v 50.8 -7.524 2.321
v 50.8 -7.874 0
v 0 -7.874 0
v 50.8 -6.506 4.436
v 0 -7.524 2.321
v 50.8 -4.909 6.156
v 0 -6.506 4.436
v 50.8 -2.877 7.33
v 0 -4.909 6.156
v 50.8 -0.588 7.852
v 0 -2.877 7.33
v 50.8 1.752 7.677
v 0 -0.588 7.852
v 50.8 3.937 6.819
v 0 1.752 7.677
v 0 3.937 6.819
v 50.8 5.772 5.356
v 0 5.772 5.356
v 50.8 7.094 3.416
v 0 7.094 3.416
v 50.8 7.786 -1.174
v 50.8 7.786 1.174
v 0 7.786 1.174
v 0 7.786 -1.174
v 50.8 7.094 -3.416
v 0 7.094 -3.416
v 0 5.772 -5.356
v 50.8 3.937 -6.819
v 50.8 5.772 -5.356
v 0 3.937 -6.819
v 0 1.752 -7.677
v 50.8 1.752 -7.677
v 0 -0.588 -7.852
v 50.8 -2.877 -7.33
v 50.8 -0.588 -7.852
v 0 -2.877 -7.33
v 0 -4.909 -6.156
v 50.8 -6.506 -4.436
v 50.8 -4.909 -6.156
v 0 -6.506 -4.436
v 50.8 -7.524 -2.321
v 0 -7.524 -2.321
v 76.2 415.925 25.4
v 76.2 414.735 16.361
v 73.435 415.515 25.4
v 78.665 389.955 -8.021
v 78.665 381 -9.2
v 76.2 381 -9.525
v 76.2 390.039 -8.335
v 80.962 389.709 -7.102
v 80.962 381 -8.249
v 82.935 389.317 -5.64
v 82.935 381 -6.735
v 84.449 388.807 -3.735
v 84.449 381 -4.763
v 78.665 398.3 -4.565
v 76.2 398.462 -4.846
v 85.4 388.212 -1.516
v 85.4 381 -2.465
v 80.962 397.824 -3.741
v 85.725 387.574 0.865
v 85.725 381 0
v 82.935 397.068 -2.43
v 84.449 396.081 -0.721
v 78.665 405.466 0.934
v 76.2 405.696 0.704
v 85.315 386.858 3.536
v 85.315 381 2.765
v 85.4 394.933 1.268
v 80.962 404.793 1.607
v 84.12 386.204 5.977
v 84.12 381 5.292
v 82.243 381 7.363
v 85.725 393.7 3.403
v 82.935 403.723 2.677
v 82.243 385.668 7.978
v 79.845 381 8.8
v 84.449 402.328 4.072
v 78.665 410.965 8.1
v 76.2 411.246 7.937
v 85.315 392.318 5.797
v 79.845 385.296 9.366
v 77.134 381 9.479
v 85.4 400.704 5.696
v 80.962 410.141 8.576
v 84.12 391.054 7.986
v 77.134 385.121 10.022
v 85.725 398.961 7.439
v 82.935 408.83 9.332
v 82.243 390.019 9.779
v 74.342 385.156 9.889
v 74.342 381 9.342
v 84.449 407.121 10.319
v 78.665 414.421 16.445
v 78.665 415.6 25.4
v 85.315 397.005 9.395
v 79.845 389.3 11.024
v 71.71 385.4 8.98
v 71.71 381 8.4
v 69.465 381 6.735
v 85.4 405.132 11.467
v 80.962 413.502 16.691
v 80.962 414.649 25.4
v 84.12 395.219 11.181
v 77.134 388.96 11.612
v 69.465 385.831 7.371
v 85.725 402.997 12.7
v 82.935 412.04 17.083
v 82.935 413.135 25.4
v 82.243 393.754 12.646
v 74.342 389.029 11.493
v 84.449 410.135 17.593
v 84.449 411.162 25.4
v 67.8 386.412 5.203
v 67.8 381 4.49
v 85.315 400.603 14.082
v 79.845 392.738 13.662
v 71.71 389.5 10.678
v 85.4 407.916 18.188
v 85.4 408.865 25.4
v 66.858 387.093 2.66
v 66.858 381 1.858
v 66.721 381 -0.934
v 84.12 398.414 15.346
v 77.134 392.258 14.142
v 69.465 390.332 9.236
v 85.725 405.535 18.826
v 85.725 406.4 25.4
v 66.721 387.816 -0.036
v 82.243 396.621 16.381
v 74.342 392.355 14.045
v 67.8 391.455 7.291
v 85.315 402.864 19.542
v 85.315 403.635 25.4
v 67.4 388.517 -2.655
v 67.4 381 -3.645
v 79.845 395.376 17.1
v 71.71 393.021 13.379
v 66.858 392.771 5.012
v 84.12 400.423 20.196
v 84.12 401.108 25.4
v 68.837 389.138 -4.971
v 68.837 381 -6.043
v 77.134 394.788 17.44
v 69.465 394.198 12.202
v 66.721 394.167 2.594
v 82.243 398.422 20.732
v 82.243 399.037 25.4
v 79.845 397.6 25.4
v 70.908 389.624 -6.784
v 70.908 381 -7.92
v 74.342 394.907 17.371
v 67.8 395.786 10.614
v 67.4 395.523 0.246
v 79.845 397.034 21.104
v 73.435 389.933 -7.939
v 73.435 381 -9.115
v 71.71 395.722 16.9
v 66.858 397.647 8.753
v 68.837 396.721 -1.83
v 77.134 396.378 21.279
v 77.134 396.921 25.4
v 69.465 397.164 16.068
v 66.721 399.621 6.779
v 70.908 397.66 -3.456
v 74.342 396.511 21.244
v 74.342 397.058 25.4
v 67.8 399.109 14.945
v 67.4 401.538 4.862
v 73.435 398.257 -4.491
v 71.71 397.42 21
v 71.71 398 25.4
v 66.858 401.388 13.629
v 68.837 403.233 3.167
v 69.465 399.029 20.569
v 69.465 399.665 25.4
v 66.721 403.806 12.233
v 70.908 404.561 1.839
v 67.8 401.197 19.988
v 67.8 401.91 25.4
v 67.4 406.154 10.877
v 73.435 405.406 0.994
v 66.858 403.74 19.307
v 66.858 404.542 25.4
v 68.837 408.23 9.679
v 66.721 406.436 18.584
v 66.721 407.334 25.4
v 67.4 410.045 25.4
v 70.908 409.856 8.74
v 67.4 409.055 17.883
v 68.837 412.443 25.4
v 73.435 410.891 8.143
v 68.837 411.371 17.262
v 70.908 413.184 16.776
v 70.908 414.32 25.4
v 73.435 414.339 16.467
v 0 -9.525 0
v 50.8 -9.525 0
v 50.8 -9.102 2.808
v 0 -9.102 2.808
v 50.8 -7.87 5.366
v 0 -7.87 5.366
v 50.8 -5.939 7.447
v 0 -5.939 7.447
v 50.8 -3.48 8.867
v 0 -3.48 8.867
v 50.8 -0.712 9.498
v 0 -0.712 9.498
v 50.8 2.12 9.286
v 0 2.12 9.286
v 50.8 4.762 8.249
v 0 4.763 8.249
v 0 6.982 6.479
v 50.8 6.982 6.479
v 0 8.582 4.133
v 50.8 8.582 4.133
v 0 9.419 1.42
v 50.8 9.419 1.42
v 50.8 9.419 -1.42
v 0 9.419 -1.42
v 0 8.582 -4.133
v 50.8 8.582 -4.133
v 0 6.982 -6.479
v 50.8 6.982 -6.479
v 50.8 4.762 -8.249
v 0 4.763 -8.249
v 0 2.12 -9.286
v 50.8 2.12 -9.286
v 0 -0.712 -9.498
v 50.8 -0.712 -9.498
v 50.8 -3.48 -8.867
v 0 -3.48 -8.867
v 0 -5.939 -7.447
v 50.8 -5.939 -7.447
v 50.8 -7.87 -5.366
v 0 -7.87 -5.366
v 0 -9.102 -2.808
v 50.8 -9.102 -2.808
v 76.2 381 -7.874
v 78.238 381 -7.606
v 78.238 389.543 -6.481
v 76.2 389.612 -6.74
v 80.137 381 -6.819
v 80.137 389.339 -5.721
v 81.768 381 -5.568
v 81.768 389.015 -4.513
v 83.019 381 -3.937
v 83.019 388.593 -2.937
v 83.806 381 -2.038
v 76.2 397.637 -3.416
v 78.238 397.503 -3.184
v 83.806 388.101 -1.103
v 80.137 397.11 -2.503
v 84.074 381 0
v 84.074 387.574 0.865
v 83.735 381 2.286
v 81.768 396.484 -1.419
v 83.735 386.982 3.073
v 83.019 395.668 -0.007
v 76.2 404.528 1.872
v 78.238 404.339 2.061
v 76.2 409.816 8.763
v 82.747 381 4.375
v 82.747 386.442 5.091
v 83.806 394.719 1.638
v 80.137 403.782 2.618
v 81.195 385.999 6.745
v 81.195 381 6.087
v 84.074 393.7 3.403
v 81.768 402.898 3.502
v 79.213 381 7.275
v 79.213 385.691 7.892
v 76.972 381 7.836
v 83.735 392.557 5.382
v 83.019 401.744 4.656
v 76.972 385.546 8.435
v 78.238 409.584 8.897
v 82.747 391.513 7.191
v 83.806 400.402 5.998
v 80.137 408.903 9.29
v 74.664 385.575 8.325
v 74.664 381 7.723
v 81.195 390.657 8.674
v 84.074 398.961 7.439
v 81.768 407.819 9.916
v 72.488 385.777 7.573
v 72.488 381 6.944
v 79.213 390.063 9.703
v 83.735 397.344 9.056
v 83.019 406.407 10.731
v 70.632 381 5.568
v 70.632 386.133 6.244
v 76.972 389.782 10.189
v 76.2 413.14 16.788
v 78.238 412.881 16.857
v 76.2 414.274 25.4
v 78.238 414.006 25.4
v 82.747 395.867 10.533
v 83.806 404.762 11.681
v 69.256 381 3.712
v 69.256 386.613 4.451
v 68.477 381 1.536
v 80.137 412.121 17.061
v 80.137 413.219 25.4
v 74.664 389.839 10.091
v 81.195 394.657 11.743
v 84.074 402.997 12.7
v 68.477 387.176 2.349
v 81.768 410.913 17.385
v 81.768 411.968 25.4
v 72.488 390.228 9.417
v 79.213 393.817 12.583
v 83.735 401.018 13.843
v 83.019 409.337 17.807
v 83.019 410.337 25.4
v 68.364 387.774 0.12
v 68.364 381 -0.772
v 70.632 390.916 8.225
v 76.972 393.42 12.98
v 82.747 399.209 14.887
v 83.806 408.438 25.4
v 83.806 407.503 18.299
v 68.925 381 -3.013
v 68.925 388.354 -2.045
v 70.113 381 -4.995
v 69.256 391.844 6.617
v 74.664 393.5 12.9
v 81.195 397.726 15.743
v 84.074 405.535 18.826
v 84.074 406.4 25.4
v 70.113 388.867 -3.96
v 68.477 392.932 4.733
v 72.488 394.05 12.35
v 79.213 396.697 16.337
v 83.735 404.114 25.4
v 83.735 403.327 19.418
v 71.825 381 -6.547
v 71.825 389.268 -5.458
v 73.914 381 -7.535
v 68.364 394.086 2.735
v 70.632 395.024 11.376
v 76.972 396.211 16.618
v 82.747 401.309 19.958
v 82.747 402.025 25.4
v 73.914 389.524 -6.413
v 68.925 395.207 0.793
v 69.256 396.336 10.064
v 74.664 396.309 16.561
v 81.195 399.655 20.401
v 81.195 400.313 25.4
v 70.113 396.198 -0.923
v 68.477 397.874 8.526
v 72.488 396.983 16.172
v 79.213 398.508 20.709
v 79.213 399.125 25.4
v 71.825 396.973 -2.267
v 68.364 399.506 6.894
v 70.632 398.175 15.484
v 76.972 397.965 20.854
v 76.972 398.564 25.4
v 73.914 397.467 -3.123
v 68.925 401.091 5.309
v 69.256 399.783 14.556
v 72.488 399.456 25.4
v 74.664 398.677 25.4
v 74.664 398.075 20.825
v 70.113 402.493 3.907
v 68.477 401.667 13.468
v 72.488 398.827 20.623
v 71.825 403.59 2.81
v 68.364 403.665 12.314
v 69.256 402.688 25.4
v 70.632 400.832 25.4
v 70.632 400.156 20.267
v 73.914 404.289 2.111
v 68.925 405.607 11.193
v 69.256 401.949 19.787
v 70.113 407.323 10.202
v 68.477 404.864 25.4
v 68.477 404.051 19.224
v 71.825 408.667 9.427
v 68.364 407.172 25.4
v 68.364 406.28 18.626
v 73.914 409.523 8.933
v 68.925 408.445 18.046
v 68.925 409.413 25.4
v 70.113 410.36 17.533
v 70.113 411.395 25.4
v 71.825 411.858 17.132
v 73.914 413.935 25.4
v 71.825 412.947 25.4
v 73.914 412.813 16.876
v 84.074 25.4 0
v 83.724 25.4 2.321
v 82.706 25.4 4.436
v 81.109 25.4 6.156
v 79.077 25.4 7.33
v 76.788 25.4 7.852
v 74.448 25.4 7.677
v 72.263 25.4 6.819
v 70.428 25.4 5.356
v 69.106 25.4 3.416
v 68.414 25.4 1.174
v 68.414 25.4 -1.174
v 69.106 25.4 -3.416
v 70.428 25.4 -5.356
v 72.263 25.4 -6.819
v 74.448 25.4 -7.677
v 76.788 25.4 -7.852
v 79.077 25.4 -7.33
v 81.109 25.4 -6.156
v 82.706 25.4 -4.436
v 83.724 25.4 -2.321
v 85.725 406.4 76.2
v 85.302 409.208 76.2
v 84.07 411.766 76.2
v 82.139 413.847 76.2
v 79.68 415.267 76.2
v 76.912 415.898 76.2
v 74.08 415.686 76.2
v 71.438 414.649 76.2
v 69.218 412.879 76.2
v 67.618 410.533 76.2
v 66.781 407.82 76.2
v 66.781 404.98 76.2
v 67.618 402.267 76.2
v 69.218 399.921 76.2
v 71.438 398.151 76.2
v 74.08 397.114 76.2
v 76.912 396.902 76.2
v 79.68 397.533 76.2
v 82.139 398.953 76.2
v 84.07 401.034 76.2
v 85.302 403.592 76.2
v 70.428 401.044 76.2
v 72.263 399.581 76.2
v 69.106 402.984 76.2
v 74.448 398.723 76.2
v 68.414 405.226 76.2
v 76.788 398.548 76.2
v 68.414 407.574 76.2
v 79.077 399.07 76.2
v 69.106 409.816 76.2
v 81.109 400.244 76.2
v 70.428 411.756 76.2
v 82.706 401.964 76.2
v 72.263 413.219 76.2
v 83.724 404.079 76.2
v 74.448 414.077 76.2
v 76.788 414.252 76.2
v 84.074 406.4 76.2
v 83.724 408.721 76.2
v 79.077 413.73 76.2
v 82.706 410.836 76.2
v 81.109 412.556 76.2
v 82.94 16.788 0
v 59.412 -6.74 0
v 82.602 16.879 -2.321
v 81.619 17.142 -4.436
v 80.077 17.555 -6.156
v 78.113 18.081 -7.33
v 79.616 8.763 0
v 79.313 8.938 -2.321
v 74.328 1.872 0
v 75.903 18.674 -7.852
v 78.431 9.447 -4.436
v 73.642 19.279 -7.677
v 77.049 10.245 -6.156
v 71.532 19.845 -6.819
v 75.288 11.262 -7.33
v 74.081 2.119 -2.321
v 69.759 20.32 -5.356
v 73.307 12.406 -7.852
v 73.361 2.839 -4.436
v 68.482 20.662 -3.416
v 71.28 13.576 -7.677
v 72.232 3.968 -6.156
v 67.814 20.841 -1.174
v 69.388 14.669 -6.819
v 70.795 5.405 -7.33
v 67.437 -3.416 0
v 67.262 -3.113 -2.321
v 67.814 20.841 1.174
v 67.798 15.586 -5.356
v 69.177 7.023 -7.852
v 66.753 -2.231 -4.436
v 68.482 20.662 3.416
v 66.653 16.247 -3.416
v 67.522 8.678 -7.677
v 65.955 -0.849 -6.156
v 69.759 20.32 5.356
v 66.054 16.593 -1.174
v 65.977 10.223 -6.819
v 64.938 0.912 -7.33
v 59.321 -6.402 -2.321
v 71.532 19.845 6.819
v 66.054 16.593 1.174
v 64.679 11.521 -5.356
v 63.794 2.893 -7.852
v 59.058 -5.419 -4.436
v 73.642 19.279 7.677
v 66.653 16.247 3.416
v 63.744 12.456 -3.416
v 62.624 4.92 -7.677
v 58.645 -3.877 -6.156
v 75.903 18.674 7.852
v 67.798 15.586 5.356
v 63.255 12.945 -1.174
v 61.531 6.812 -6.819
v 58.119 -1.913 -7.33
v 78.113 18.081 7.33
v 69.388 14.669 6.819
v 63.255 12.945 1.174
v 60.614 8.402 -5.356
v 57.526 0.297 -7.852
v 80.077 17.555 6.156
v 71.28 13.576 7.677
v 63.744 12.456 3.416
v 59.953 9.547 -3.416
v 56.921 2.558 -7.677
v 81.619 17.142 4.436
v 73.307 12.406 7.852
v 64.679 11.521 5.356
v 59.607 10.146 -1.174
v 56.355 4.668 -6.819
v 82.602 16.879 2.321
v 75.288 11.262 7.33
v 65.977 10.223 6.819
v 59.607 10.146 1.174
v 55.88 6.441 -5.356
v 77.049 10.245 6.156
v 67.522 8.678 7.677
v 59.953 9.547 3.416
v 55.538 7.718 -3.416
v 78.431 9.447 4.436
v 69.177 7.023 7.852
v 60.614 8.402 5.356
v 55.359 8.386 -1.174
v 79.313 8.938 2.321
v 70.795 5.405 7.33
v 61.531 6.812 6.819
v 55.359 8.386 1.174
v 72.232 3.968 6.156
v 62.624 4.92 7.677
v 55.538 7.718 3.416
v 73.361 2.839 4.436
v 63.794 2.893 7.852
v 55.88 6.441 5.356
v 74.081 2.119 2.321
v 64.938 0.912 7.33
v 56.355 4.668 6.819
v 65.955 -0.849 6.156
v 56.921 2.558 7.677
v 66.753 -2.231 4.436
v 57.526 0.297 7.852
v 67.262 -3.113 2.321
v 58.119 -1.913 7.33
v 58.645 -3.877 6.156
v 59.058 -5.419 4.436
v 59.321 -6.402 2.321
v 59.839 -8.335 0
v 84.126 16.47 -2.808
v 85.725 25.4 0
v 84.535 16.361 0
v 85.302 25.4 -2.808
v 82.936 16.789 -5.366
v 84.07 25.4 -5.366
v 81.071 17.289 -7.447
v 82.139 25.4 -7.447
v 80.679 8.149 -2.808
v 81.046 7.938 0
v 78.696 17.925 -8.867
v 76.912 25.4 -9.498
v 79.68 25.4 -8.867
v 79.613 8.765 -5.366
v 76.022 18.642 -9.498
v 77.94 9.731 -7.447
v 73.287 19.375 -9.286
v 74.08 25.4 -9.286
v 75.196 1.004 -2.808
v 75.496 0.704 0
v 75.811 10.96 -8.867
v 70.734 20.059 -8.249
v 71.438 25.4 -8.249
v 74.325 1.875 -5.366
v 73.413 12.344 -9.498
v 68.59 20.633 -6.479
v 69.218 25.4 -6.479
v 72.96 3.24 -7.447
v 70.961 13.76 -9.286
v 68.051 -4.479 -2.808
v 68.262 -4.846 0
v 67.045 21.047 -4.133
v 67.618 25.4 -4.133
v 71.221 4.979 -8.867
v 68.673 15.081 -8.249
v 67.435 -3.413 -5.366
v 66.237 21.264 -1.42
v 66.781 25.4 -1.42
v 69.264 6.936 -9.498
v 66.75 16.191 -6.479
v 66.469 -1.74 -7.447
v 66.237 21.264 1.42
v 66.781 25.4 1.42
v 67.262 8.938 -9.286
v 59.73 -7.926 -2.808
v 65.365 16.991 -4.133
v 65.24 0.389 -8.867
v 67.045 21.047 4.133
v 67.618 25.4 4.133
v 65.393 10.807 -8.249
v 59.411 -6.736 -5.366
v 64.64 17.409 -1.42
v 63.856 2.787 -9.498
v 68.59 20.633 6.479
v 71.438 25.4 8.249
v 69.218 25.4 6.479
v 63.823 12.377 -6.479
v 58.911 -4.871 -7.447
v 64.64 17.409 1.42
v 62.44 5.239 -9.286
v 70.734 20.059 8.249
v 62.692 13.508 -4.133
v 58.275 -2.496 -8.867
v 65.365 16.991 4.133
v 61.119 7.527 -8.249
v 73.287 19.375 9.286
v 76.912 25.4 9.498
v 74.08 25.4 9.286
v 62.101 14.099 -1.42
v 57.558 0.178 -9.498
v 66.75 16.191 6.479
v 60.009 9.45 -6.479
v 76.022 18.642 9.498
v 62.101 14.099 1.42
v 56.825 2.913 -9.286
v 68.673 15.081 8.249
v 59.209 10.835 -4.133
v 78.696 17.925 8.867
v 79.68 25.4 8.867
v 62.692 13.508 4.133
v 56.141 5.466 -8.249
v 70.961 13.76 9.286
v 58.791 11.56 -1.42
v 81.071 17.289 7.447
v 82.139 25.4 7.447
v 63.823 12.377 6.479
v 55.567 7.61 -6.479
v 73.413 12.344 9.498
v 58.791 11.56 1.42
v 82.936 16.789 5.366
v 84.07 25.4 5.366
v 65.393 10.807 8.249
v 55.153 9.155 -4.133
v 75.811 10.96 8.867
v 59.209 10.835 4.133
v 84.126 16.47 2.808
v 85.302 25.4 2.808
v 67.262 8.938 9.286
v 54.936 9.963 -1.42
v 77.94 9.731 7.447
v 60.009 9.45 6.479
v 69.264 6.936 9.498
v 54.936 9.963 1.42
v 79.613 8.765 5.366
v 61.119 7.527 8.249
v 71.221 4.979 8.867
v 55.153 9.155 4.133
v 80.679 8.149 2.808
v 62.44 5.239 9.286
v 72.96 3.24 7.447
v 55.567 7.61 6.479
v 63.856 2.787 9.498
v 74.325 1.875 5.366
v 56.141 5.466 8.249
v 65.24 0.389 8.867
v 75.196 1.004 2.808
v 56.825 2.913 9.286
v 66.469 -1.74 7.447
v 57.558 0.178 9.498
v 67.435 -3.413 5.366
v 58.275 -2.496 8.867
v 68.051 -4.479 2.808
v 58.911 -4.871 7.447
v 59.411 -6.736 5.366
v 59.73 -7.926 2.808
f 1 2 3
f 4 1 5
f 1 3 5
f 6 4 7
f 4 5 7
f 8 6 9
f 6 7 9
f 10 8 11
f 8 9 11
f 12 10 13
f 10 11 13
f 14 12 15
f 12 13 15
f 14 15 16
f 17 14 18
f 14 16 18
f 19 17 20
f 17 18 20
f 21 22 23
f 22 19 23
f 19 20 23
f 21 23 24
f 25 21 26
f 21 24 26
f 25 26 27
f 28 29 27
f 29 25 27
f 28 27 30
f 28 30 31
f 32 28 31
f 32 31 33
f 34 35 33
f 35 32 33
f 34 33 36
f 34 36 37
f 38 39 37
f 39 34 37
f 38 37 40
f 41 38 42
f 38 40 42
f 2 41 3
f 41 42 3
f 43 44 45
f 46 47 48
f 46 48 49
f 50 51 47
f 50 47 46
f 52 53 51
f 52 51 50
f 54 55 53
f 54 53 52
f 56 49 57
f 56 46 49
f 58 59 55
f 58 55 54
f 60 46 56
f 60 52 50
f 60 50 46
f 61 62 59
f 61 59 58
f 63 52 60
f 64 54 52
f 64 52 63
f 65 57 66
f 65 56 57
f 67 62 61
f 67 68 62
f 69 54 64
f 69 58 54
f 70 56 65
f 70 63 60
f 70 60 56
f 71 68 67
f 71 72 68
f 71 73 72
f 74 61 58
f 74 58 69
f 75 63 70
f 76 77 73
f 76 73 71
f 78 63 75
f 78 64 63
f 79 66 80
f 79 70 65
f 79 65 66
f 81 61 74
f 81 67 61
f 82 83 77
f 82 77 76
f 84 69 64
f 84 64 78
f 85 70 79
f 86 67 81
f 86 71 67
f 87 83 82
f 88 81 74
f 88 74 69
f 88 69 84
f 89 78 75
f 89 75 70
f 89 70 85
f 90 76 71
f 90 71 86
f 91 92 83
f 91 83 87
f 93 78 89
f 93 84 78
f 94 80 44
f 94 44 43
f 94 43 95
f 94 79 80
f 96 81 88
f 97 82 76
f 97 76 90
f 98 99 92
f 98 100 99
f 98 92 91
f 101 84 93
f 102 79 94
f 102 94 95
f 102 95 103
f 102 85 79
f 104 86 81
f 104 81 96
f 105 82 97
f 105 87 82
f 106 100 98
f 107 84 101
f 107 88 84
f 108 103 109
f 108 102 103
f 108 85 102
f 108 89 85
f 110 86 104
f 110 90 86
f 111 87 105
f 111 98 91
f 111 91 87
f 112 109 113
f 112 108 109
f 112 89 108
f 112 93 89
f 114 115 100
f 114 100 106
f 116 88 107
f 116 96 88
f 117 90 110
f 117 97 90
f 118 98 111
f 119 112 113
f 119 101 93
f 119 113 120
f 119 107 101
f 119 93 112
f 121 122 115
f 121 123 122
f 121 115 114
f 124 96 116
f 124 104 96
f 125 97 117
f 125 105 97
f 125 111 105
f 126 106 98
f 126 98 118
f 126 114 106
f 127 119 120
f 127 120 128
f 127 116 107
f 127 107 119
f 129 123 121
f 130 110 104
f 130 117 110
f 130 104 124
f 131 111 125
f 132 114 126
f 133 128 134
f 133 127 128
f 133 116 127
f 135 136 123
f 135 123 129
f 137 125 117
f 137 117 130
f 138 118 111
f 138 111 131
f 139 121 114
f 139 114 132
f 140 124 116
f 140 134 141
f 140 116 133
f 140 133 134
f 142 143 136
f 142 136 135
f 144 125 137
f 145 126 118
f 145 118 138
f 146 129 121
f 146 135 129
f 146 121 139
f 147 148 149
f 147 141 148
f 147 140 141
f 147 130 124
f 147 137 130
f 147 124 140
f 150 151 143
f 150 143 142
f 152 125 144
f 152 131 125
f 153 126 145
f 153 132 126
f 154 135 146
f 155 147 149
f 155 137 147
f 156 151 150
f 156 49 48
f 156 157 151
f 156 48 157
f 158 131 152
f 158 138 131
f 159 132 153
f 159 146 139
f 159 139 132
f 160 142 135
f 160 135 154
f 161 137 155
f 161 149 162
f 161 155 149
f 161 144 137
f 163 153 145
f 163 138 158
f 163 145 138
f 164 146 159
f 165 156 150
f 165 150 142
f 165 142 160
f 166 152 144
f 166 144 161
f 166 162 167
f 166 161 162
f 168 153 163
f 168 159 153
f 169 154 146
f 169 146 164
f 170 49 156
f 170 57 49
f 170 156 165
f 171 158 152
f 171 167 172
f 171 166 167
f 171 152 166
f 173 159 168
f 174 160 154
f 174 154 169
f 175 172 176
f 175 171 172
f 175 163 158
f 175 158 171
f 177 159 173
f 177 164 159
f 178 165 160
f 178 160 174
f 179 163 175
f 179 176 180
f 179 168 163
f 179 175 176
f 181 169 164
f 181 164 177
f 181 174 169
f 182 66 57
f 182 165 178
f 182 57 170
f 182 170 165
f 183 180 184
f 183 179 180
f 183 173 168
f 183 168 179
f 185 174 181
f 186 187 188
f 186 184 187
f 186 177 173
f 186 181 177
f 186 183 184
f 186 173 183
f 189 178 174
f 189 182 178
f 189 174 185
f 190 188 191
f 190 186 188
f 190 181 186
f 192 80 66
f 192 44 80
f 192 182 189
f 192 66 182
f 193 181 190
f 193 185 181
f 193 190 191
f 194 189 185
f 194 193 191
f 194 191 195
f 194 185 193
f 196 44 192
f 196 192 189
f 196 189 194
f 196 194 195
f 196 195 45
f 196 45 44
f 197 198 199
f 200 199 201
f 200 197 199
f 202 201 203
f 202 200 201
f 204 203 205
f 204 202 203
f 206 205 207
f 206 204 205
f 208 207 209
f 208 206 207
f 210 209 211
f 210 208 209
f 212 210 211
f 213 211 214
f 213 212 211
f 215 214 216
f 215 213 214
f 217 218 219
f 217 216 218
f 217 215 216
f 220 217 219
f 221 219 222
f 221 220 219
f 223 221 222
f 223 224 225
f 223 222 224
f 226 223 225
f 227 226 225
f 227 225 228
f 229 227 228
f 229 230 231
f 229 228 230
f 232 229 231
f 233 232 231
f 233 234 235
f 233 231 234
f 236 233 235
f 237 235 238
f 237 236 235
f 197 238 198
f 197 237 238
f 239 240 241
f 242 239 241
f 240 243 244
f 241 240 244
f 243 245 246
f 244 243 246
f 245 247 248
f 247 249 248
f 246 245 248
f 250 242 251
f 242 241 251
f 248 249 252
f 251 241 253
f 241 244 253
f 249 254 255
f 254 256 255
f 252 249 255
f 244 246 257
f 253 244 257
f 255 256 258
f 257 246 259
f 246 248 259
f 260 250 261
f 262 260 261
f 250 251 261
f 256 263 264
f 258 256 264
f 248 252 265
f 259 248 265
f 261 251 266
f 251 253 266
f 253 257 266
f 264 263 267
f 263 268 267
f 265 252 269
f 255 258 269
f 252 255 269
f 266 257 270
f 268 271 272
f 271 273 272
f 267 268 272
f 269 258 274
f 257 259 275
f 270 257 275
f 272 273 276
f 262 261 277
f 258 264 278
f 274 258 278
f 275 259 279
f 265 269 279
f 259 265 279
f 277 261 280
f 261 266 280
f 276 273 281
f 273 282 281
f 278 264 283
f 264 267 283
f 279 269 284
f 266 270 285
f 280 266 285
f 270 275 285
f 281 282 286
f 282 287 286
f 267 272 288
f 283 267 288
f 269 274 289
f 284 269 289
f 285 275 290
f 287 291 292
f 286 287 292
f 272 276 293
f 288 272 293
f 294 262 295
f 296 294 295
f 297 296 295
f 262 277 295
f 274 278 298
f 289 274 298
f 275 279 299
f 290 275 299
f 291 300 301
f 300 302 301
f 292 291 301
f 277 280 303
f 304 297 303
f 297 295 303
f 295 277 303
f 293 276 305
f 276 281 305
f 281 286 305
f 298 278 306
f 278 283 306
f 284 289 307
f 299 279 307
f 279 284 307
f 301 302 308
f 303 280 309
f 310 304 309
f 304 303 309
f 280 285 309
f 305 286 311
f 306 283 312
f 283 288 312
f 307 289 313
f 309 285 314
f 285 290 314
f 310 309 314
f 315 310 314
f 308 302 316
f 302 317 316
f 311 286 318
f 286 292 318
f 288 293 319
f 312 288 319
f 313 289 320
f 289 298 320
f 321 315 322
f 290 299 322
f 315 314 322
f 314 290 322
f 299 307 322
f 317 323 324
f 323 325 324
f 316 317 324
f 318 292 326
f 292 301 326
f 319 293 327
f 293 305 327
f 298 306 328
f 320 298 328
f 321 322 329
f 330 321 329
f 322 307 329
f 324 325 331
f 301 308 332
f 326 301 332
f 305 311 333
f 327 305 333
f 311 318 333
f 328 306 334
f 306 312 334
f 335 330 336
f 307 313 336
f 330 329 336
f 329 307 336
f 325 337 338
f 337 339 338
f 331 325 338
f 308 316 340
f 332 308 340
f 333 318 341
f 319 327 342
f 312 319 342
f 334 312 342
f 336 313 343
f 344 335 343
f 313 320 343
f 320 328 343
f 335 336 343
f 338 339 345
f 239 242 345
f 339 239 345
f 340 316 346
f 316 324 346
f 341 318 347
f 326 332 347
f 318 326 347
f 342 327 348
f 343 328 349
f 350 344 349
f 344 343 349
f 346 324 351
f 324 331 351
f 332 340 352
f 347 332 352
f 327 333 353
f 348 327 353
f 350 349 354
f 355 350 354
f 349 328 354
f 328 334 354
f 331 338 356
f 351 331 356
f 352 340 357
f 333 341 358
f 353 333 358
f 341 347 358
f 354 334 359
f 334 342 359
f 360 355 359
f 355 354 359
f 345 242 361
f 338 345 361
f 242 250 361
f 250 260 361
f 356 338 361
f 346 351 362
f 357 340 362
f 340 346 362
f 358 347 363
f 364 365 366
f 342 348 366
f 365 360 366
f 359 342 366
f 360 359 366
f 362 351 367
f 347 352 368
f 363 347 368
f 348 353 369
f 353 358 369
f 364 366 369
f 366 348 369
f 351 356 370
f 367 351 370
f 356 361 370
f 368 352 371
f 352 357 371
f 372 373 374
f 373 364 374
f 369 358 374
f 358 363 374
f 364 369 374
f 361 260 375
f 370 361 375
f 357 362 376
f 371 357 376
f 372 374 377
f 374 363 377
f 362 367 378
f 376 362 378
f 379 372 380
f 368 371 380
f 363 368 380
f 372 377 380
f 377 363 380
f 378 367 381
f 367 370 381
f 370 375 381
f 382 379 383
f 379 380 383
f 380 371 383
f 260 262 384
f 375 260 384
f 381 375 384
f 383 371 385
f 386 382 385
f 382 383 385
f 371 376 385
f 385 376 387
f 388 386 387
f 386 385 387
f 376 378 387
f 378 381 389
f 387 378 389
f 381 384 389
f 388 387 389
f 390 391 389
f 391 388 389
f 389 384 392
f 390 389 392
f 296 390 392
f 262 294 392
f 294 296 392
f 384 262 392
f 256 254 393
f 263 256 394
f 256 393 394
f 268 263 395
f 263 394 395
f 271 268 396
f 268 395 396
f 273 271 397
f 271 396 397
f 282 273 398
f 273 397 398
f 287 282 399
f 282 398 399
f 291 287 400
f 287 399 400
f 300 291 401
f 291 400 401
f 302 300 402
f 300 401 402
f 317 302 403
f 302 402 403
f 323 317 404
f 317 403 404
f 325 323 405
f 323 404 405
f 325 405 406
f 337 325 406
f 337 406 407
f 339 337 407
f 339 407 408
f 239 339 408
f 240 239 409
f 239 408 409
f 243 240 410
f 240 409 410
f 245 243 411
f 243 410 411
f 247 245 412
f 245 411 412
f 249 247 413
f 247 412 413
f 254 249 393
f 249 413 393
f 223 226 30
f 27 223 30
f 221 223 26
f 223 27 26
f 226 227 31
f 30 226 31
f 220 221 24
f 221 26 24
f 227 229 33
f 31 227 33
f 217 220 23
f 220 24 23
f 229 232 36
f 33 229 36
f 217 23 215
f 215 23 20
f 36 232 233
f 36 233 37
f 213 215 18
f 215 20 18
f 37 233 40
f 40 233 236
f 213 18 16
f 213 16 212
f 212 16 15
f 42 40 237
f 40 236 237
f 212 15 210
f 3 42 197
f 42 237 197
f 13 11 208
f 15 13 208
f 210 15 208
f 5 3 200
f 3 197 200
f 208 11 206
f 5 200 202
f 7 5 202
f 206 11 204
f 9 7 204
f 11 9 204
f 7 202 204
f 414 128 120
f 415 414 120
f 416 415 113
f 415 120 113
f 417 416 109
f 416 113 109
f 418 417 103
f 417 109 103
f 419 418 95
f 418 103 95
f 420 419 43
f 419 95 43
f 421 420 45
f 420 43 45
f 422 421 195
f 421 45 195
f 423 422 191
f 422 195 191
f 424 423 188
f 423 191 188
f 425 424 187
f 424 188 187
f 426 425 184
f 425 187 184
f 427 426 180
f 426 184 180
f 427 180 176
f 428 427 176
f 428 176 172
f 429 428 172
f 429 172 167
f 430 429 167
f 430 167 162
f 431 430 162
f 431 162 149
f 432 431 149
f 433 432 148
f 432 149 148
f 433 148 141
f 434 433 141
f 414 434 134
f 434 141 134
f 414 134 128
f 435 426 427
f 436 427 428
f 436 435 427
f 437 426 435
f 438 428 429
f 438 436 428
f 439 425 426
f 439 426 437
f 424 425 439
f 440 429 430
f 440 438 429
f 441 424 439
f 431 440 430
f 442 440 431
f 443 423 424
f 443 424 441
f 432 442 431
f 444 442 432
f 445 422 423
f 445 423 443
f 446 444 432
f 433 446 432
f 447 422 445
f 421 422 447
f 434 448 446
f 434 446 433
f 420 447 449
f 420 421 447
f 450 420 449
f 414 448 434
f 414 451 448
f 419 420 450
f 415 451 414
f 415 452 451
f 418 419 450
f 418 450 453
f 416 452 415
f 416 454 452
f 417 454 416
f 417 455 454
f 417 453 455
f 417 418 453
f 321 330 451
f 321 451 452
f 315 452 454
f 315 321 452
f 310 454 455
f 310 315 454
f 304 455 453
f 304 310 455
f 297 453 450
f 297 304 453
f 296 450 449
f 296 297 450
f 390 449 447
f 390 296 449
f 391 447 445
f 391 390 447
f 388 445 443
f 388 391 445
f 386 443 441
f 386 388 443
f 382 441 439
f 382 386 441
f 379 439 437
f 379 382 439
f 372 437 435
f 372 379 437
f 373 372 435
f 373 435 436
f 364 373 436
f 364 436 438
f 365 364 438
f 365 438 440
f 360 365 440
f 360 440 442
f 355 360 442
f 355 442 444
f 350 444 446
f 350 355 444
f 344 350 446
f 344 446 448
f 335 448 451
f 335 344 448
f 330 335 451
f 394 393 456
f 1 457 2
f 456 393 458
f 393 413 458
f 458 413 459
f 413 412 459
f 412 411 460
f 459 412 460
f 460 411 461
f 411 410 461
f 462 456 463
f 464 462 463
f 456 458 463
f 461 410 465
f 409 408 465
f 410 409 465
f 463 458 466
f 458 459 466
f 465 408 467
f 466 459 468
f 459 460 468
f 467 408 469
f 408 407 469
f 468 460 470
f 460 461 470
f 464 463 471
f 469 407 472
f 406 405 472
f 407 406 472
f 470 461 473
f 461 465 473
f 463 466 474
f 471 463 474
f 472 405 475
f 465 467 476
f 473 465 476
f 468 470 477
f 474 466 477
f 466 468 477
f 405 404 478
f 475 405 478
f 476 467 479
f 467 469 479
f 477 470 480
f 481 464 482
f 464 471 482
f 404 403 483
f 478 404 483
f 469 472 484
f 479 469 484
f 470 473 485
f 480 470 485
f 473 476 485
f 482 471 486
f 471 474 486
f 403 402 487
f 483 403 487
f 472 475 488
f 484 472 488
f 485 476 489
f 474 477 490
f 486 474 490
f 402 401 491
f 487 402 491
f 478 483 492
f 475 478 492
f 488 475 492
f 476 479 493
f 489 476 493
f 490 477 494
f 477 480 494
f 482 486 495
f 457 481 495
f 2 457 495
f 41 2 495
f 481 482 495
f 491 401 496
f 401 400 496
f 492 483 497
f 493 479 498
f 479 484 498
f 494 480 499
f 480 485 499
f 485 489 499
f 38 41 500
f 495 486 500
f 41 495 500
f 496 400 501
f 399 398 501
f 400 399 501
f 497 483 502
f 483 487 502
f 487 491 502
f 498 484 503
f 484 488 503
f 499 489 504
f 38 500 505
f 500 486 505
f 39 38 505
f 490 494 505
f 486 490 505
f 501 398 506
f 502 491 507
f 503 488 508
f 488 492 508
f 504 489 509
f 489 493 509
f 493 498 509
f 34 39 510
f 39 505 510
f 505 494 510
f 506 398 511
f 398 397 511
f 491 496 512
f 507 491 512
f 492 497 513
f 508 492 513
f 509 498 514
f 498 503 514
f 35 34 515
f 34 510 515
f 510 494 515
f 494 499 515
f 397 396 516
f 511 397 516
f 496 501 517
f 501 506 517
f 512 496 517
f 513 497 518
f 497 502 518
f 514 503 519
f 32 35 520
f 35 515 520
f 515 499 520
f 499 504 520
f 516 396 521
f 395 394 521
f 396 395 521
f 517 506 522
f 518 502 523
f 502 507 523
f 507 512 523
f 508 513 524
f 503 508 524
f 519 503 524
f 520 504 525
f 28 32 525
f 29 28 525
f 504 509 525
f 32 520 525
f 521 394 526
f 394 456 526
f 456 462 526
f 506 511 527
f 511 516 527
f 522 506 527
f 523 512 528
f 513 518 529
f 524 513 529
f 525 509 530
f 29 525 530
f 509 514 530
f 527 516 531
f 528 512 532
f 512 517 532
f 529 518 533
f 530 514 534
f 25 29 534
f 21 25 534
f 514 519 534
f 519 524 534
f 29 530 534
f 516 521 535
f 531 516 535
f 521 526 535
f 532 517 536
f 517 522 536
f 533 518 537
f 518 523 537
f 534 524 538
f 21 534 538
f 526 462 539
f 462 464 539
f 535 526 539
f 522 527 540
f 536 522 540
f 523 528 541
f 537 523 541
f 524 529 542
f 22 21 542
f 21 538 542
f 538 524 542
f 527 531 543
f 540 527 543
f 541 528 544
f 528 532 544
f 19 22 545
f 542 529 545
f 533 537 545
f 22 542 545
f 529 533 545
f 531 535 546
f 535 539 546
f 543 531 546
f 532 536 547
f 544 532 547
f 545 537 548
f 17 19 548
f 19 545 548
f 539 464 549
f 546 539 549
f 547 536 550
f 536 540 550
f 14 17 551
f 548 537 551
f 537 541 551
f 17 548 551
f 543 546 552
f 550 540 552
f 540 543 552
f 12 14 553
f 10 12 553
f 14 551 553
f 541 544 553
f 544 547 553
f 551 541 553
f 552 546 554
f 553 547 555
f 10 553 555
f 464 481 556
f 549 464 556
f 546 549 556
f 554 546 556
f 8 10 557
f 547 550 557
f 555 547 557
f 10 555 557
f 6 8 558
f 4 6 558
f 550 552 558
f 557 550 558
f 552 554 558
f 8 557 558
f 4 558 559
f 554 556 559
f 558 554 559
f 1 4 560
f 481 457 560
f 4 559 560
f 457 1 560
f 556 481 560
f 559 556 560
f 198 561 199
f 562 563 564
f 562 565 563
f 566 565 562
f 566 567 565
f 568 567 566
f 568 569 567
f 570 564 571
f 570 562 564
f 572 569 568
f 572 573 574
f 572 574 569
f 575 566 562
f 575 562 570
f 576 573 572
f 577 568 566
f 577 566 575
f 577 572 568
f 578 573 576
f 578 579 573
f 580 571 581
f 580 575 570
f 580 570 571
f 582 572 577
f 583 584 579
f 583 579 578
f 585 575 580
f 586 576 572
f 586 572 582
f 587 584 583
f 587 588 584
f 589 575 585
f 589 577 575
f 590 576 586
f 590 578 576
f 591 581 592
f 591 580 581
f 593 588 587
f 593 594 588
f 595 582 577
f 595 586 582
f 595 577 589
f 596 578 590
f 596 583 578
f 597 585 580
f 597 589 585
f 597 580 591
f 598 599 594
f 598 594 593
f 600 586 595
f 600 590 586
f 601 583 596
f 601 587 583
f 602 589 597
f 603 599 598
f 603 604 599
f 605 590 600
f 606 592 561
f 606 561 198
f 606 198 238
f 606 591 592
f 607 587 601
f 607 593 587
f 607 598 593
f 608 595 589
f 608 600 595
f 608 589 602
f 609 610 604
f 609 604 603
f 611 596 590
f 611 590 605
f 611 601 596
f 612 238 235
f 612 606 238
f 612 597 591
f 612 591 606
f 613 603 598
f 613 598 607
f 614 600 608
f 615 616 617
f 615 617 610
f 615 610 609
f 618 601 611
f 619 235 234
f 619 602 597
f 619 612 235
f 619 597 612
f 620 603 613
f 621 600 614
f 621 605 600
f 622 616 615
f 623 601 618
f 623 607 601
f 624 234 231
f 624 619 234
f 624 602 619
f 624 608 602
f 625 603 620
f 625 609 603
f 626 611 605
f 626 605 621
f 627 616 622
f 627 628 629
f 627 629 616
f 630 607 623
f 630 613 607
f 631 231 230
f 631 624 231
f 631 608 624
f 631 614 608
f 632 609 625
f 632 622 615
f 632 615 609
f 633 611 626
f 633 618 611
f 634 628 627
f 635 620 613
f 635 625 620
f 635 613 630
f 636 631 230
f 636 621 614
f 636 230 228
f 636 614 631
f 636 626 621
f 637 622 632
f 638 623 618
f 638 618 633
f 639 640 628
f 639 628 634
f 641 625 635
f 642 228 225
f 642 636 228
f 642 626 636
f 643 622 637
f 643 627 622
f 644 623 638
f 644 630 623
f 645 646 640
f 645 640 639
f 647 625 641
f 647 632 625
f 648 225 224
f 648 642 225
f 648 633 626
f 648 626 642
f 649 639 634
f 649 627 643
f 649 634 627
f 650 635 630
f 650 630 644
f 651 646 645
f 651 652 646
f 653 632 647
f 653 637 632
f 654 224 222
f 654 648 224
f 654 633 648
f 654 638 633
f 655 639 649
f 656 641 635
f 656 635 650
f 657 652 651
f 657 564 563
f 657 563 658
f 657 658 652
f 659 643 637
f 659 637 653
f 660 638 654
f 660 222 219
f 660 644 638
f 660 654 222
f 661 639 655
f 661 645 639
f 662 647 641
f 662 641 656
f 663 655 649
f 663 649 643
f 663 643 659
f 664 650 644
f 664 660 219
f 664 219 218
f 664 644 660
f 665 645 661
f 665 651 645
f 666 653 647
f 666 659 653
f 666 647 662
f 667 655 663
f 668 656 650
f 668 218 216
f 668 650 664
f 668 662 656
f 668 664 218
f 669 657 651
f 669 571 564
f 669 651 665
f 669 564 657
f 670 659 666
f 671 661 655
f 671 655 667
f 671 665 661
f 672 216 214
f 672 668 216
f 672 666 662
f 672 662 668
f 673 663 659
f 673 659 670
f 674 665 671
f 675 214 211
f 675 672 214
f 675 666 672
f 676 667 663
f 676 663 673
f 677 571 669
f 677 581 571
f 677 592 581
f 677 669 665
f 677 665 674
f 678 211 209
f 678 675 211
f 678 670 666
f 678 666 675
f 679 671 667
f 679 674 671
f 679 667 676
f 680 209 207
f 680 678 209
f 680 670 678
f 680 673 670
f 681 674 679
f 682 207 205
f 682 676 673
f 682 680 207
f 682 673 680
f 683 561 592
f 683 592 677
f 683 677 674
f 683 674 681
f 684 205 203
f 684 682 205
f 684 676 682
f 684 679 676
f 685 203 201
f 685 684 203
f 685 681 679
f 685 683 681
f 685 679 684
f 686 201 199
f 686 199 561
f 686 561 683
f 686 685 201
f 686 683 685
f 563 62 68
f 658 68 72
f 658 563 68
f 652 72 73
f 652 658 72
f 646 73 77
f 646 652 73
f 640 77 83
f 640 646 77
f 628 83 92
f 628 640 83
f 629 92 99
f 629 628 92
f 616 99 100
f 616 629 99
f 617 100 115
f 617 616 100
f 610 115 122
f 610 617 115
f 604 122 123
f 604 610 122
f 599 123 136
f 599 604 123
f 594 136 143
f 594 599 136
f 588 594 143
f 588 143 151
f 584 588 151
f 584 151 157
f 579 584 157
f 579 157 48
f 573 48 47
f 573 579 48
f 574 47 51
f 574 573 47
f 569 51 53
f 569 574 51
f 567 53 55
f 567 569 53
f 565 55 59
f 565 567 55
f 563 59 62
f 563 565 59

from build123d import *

# Parameters (mm, degrees)
SKETCH1_R            = 9.525
SKETCH1_R_2          = 7.874
SWEEP2_START         = 25.3999999
SWEEP2_OUTLINE_R     = 9.525
SWEEP2_OUTLINE_R_2   = 7.874
SWEEP2_DEPTH         = 50.8000001
SWEEP2_2_OUTLINE_R   = 9.525
SWEEP2_2_OUTLINE_R_2 = 7.874
SWEEP2_2_ANGLE       = 90


with BuildPart() as part:
    # Sweep1: sweep along a path in Sketch2
    with BuildLine(Plane.XY) as sweep1_path:
        Line((76.2, 381), (76.2, 25.4))
        ThreePointArc((76.2, 25.4), (68.760512242, 7.439487758), (50.8, 0))
        Line((50.8, 0), (0, 0))
    # Sketch1 → Sweep1 (sweep)
    with BuildSketch(Plane(origin=(0, 0, 0), x_dir=(0, -1, 0), z_dir=(1, 0, 0))):
        Circle(SKETCH1_R)
        Circle(SKETCH1_R_2, mode=Mode.SUBTRACT)
    sweep(path=sweep1_path.line)



with BuildPart() as body_2:
    # Sweep2: read off the stored shape, not the designer's step
    # Sweep2 outline → Sweep2 (new body)
    with BuildSketch(Plane.XY.offset(SWEEP2_START)):
        with Locations((76.2, 406.4)):
            Circle(SWEEP2_OUTLINE_R)
        with Locations((76.2, 406.4)):
            Circle(SWEEP2_OUTLINE_R_2, mode=Mode.SUBTRACT)
    extrude(amount=SWEEP2_DEPTH)


with BuildPart() as part_1:
    add(part.part)

    add(body_2.part)  # Sweep2 2 merges body 2
    # Sweep2 2 outline → Sweep2 2 (revolve)
    with BuildSketch(Plane(origin=(0, 381, 25.4), x_dir=(0, 0, -1), z_dir=(0, -1, 0))):
        with Locations((25.4, 76.2)):
            Circle(SWEEP2_2_OUTLINE_R)
        with Locations((25.4, 76.2)):
            Circle(SWEEP2_2_OUTLINE_R_2, mode=Mode.SUBTRACT)
    revolve(axis=Axis((0, 381, 25.4), (1, 0, 0)), revolution_arc=SWEEP2_2_ANGLE)


solid = part_1.part
